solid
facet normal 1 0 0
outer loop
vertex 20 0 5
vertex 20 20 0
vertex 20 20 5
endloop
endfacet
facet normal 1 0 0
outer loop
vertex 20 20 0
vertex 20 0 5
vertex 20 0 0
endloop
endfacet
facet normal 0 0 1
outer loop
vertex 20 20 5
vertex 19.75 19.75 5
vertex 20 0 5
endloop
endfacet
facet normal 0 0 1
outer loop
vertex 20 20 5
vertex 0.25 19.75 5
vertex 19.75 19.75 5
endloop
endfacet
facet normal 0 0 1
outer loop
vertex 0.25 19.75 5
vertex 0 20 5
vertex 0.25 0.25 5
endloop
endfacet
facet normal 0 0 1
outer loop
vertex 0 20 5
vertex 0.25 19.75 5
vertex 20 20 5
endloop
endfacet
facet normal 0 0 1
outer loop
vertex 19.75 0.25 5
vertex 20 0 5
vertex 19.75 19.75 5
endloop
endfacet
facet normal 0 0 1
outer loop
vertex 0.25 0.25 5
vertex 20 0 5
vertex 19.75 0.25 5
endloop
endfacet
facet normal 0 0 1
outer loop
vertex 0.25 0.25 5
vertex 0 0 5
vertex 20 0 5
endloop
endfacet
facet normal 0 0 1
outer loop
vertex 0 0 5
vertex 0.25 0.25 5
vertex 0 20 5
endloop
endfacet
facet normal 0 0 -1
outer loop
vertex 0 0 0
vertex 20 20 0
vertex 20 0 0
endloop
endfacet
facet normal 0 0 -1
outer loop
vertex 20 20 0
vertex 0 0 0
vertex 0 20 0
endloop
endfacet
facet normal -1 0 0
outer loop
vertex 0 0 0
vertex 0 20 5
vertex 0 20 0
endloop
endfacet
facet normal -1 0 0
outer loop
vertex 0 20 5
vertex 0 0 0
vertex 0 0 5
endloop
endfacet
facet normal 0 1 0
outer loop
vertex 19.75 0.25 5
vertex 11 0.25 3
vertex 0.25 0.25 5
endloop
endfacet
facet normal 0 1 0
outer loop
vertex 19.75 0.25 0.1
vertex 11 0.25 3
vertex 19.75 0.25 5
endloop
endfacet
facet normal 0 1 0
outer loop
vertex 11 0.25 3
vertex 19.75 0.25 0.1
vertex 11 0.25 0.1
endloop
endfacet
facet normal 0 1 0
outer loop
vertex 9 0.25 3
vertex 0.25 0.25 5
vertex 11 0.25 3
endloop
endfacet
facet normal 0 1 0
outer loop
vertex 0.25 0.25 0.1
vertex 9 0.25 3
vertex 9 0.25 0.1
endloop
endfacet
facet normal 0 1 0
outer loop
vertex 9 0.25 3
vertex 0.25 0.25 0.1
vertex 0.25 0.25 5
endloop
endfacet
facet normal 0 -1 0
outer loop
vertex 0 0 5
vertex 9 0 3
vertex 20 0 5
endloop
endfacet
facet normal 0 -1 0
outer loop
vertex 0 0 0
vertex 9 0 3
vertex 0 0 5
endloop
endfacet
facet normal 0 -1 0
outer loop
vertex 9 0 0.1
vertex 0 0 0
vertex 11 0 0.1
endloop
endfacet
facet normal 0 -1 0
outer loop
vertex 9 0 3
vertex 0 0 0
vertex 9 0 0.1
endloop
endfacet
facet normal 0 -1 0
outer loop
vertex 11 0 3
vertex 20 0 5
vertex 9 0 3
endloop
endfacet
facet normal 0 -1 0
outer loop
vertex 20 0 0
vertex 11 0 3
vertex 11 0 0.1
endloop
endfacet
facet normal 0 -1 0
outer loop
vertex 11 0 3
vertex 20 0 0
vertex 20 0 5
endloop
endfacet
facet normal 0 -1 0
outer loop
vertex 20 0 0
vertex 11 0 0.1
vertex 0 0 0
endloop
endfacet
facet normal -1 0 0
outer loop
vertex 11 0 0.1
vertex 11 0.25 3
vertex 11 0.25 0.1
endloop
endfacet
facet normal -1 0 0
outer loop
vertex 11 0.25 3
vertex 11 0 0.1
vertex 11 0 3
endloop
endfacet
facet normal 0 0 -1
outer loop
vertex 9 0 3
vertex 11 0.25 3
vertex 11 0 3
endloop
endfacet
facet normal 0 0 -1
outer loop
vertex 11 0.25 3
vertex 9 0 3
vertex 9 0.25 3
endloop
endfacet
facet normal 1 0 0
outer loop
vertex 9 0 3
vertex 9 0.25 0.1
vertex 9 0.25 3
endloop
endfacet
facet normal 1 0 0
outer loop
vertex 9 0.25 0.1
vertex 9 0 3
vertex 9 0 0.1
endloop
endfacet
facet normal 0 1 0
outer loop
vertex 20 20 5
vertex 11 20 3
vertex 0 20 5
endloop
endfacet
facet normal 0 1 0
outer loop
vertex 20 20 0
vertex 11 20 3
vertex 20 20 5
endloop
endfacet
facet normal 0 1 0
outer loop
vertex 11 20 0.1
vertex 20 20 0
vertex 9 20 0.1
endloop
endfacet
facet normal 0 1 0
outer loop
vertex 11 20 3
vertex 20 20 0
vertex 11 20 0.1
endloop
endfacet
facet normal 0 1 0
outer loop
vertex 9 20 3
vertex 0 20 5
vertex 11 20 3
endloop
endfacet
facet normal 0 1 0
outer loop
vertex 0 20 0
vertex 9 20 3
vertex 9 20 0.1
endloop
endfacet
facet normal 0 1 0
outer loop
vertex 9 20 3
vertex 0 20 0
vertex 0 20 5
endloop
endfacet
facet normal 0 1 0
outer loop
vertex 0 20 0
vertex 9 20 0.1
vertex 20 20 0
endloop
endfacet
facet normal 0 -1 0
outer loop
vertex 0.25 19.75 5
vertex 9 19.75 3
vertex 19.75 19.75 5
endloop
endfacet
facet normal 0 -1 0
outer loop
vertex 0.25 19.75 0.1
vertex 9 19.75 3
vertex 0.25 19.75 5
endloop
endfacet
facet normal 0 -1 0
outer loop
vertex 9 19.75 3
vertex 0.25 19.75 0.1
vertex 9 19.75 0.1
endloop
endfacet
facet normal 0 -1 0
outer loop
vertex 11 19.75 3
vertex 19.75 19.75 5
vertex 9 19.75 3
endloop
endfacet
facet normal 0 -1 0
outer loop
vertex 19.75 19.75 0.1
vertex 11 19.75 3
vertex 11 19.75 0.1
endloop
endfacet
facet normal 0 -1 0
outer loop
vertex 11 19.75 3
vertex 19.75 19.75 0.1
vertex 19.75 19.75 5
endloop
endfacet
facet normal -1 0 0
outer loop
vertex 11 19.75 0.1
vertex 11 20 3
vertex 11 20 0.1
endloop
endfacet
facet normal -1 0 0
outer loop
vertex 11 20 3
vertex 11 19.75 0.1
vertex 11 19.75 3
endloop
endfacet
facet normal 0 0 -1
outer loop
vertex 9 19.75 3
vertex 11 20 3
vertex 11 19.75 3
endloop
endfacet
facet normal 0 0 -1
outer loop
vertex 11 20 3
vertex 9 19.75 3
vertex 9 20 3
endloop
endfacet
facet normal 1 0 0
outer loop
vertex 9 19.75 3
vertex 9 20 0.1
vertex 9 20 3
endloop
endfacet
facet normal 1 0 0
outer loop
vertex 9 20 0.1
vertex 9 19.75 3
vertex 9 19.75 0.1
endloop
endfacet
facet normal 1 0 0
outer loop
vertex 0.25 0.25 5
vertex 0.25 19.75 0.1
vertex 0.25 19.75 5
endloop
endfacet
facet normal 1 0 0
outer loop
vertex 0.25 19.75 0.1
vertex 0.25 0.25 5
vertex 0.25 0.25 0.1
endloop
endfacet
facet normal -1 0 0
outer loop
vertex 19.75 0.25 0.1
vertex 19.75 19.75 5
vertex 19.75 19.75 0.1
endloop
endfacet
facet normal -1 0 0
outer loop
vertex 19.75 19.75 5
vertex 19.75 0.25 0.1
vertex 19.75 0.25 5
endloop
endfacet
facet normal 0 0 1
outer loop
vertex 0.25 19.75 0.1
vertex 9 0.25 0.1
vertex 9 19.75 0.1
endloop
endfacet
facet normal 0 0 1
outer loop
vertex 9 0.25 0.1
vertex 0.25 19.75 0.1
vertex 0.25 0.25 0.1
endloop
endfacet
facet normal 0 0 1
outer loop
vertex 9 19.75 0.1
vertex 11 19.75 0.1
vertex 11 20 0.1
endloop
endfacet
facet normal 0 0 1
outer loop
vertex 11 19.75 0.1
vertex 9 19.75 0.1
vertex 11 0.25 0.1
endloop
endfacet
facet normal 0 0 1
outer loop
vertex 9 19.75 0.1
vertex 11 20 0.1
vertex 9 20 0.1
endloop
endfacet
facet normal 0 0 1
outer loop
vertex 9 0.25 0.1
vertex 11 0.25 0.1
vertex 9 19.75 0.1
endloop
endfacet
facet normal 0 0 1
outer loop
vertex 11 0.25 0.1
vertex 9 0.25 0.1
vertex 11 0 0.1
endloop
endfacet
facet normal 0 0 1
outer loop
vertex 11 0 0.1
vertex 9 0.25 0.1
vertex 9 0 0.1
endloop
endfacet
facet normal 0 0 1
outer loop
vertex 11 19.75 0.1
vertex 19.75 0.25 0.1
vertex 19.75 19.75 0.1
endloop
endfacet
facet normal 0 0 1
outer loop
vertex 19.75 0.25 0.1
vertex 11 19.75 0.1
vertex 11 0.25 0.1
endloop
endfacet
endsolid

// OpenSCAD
buildingX=20;
buildingY=20;
floorHeight=5;
doorWidth=2;
doorHeight=3;
wallThickness=0.25;

cube([wallThickness,buildingY,floorHeight]);

translate([buildingX-wallThickness,0,0])
cube([wallThickness,buildingY,floorHeight]);

difference(){
cube([buildingX,wallThickness,floorHeight]);

translate([buildingX/2-doorWidth/2,0,0])
cube([doorWidth,wallThickness*10,doorHeight]);
}

difference(){
translate([0,buildingY-wallThickness,0])
cube([buildingX,wallThickness,floorHeight]);

translate([buildingX/2-doorWidth/2,buildingY-wallThickness,0])
cube([doorWidth,wallThickness*10,doorHeight]);
}

cube([buildingX,buildingY,0.1]);
